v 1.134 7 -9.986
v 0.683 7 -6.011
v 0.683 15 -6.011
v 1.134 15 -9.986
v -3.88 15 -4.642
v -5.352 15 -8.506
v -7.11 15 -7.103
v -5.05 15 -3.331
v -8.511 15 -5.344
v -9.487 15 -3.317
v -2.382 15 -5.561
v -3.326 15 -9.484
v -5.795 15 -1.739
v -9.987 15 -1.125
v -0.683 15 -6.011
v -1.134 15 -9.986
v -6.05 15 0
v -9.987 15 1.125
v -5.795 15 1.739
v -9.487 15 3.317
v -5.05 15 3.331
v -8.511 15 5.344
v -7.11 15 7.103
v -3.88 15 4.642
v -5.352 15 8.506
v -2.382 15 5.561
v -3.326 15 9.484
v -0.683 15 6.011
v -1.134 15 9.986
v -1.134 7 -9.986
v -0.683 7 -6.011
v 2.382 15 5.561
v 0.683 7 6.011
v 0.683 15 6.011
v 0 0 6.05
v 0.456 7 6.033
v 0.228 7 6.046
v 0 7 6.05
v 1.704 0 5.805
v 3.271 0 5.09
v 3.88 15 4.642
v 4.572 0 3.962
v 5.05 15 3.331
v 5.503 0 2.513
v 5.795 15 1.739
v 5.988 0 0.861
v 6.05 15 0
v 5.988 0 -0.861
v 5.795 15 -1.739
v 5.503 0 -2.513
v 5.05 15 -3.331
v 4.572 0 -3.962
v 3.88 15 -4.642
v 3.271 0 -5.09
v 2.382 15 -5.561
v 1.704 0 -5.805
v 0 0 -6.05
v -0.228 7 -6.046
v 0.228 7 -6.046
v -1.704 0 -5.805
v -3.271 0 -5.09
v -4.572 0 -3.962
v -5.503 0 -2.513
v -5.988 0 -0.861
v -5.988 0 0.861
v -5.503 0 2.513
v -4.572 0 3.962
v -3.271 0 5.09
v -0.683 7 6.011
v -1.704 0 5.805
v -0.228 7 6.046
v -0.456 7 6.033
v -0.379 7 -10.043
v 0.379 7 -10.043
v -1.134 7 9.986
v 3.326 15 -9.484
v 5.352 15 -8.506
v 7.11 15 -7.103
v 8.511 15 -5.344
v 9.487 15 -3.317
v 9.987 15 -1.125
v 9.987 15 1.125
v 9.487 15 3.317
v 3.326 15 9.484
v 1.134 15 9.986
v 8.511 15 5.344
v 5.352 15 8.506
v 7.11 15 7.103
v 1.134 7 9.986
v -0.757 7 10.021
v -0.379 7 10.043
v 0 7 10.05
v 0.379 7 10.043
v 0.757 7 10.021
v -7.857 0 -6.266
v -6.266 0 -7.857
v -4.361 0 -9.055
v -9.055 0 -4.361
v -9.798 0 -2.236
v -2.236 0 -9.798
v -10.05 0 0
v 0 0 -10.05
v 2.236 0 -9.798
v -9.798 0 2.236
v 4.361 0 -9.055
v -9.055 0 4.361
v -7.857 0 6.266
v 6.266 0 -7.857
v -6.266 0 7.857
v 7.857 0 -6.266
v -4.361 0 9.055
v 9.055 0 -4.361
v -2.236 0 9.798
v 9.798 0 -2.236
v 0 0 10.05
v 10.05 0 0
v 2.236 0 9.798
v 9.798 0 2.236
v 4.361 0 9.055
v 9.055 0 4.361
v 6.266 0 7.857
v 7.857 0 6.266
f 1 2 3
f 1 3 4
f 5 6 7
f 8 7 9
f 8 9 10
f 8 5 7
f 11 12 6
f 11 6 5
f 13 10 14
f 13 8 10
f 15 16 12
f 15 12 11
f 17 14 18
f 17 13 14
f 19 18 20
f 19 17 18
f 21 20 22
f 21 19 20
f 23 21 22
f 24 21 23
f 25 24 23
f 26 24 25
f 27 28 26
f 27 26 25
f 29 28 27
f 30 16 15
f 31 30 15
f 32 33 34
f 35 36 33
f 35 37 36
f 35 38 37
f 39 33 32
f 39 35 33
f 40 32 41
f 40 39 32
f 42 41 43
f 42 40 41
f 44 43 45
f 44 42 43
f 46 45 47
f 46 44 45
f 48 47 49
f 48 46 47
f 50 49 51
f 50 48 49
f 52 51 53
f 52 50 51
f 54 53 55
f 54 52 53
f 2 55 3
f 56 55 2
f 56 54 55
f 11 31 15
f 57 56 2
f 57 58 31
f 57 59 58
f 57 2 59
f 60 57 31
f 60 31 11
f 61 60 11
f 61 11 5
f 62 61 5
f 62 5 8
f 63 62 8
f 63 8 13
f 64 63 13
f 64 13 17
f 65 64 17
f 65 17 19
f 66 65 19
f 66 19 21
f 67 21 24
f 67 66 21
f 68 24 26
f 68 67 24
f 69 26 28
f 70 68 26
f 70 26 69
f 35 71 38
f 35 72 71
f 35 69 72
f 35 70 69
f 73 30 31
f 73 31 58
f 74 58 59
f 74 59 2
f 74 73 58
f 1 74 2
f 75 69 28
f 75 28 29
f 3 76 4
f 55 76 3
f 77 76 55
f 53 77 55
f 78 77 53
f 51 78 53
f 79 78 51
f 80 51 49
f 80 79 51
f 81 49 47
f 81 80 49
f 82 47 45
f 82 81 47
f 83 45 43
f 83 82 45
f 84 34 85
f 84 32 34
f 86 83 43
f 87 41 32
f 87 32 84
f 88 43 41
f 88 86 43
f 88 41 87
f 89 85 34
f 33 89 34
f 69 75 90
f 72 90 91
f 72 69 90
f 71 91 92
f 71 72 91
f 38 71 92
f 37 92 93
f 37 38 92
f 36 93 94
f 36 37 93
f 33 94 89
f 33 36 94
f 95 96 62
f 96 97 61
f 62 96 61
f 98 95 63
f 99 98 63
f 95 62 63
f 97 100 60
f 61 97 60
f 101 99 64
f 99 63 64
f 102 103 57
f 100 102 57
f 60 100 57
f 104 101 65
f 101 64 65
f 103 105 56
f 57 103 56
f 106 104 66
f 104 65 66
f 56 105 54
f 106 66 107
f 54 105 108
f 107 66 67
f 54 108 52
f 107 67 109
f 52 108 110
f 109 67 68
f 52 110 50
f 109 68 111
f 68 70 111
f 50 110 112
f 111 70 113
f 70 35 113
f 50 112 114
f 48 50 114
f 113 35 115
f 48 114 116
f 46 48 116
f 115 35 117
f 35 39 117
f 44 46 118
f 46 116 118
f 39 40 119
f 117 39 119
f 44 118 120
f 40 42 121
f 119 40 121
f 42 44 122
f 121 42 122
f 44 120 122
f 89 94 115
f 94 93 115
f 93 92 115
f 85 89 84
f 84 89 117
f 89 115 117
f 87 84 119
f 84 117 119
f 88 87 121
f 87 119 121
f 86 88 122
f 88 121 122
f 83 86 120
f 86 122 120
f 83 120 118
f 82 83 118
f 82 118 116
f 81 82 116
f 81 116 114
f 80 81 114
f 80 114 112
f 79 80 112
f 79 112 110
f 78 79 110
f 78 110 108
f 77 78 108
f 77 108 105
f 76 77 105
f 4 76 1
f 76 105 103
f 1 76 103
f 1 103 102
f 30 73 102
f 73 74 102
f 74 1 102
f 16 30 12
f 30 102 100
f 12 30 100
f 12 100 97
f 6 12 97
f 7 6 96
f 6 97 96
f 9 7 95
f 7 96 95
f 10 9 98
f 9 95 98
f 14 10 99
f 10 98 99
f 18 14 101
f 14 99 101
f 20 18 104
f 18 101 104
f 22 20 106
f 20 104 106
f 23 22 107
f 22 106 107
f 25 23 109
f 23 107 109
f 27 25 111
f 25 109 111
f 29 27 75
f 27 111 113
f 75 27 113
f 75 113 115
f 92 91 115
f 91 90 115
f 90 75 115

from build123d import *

# Parameters (mm, degrees)
SKETCH1_R           = 10.05
SKETCH1_R_2         = 6.05
BOSS_EXTRUDE1_DEPTH = 15
CUT_EXTRUDE2_DEPTH  = 8


with BuildPart() as part:
    # Sketch1 → Boss-Extrude1 (new body)
    with BuildSketch(Plane(origin=(0, 0, 0), x_dir=(1, 0, 0), z_dir=(0, 1, 0))):
        with Locations(Location((0, 0, 0), (0, 0, 270))):
            Circle(SKETCH1_R)
        with Locations(Location((0, 0, 0), (0, 0, 270))):
            Circle(SKETCH1_R_2, mode=Mode.SUBTRACT)
    extrude(amount=BOSS_EXTRUDE1_DEPTH)

    # Sketch6 → Cut-Extrude2 (cut)
    with BuildSketch(Plane(origin=(0, 15, 0), x_dir=(1, 0, 0), z_dir=(0, 1, 0))):
        Polygon((-0.637272671, 5.61077026), (0.637272671, 5.61077026), (1.215708589, 10.703521268), (-1.215708589, 10.703521268), align=None)
        Polygon((-0.637272671, -5.61077026), (-1.215708589, -10.703521268), (1.215708589, -10.703521268), (0.637272671, -5.61077026), align=None)
    extrude(amount=-CUT_EXTRUDE2_DEPTH, mode=Mode.SUBTRACT)


solid = part.part
